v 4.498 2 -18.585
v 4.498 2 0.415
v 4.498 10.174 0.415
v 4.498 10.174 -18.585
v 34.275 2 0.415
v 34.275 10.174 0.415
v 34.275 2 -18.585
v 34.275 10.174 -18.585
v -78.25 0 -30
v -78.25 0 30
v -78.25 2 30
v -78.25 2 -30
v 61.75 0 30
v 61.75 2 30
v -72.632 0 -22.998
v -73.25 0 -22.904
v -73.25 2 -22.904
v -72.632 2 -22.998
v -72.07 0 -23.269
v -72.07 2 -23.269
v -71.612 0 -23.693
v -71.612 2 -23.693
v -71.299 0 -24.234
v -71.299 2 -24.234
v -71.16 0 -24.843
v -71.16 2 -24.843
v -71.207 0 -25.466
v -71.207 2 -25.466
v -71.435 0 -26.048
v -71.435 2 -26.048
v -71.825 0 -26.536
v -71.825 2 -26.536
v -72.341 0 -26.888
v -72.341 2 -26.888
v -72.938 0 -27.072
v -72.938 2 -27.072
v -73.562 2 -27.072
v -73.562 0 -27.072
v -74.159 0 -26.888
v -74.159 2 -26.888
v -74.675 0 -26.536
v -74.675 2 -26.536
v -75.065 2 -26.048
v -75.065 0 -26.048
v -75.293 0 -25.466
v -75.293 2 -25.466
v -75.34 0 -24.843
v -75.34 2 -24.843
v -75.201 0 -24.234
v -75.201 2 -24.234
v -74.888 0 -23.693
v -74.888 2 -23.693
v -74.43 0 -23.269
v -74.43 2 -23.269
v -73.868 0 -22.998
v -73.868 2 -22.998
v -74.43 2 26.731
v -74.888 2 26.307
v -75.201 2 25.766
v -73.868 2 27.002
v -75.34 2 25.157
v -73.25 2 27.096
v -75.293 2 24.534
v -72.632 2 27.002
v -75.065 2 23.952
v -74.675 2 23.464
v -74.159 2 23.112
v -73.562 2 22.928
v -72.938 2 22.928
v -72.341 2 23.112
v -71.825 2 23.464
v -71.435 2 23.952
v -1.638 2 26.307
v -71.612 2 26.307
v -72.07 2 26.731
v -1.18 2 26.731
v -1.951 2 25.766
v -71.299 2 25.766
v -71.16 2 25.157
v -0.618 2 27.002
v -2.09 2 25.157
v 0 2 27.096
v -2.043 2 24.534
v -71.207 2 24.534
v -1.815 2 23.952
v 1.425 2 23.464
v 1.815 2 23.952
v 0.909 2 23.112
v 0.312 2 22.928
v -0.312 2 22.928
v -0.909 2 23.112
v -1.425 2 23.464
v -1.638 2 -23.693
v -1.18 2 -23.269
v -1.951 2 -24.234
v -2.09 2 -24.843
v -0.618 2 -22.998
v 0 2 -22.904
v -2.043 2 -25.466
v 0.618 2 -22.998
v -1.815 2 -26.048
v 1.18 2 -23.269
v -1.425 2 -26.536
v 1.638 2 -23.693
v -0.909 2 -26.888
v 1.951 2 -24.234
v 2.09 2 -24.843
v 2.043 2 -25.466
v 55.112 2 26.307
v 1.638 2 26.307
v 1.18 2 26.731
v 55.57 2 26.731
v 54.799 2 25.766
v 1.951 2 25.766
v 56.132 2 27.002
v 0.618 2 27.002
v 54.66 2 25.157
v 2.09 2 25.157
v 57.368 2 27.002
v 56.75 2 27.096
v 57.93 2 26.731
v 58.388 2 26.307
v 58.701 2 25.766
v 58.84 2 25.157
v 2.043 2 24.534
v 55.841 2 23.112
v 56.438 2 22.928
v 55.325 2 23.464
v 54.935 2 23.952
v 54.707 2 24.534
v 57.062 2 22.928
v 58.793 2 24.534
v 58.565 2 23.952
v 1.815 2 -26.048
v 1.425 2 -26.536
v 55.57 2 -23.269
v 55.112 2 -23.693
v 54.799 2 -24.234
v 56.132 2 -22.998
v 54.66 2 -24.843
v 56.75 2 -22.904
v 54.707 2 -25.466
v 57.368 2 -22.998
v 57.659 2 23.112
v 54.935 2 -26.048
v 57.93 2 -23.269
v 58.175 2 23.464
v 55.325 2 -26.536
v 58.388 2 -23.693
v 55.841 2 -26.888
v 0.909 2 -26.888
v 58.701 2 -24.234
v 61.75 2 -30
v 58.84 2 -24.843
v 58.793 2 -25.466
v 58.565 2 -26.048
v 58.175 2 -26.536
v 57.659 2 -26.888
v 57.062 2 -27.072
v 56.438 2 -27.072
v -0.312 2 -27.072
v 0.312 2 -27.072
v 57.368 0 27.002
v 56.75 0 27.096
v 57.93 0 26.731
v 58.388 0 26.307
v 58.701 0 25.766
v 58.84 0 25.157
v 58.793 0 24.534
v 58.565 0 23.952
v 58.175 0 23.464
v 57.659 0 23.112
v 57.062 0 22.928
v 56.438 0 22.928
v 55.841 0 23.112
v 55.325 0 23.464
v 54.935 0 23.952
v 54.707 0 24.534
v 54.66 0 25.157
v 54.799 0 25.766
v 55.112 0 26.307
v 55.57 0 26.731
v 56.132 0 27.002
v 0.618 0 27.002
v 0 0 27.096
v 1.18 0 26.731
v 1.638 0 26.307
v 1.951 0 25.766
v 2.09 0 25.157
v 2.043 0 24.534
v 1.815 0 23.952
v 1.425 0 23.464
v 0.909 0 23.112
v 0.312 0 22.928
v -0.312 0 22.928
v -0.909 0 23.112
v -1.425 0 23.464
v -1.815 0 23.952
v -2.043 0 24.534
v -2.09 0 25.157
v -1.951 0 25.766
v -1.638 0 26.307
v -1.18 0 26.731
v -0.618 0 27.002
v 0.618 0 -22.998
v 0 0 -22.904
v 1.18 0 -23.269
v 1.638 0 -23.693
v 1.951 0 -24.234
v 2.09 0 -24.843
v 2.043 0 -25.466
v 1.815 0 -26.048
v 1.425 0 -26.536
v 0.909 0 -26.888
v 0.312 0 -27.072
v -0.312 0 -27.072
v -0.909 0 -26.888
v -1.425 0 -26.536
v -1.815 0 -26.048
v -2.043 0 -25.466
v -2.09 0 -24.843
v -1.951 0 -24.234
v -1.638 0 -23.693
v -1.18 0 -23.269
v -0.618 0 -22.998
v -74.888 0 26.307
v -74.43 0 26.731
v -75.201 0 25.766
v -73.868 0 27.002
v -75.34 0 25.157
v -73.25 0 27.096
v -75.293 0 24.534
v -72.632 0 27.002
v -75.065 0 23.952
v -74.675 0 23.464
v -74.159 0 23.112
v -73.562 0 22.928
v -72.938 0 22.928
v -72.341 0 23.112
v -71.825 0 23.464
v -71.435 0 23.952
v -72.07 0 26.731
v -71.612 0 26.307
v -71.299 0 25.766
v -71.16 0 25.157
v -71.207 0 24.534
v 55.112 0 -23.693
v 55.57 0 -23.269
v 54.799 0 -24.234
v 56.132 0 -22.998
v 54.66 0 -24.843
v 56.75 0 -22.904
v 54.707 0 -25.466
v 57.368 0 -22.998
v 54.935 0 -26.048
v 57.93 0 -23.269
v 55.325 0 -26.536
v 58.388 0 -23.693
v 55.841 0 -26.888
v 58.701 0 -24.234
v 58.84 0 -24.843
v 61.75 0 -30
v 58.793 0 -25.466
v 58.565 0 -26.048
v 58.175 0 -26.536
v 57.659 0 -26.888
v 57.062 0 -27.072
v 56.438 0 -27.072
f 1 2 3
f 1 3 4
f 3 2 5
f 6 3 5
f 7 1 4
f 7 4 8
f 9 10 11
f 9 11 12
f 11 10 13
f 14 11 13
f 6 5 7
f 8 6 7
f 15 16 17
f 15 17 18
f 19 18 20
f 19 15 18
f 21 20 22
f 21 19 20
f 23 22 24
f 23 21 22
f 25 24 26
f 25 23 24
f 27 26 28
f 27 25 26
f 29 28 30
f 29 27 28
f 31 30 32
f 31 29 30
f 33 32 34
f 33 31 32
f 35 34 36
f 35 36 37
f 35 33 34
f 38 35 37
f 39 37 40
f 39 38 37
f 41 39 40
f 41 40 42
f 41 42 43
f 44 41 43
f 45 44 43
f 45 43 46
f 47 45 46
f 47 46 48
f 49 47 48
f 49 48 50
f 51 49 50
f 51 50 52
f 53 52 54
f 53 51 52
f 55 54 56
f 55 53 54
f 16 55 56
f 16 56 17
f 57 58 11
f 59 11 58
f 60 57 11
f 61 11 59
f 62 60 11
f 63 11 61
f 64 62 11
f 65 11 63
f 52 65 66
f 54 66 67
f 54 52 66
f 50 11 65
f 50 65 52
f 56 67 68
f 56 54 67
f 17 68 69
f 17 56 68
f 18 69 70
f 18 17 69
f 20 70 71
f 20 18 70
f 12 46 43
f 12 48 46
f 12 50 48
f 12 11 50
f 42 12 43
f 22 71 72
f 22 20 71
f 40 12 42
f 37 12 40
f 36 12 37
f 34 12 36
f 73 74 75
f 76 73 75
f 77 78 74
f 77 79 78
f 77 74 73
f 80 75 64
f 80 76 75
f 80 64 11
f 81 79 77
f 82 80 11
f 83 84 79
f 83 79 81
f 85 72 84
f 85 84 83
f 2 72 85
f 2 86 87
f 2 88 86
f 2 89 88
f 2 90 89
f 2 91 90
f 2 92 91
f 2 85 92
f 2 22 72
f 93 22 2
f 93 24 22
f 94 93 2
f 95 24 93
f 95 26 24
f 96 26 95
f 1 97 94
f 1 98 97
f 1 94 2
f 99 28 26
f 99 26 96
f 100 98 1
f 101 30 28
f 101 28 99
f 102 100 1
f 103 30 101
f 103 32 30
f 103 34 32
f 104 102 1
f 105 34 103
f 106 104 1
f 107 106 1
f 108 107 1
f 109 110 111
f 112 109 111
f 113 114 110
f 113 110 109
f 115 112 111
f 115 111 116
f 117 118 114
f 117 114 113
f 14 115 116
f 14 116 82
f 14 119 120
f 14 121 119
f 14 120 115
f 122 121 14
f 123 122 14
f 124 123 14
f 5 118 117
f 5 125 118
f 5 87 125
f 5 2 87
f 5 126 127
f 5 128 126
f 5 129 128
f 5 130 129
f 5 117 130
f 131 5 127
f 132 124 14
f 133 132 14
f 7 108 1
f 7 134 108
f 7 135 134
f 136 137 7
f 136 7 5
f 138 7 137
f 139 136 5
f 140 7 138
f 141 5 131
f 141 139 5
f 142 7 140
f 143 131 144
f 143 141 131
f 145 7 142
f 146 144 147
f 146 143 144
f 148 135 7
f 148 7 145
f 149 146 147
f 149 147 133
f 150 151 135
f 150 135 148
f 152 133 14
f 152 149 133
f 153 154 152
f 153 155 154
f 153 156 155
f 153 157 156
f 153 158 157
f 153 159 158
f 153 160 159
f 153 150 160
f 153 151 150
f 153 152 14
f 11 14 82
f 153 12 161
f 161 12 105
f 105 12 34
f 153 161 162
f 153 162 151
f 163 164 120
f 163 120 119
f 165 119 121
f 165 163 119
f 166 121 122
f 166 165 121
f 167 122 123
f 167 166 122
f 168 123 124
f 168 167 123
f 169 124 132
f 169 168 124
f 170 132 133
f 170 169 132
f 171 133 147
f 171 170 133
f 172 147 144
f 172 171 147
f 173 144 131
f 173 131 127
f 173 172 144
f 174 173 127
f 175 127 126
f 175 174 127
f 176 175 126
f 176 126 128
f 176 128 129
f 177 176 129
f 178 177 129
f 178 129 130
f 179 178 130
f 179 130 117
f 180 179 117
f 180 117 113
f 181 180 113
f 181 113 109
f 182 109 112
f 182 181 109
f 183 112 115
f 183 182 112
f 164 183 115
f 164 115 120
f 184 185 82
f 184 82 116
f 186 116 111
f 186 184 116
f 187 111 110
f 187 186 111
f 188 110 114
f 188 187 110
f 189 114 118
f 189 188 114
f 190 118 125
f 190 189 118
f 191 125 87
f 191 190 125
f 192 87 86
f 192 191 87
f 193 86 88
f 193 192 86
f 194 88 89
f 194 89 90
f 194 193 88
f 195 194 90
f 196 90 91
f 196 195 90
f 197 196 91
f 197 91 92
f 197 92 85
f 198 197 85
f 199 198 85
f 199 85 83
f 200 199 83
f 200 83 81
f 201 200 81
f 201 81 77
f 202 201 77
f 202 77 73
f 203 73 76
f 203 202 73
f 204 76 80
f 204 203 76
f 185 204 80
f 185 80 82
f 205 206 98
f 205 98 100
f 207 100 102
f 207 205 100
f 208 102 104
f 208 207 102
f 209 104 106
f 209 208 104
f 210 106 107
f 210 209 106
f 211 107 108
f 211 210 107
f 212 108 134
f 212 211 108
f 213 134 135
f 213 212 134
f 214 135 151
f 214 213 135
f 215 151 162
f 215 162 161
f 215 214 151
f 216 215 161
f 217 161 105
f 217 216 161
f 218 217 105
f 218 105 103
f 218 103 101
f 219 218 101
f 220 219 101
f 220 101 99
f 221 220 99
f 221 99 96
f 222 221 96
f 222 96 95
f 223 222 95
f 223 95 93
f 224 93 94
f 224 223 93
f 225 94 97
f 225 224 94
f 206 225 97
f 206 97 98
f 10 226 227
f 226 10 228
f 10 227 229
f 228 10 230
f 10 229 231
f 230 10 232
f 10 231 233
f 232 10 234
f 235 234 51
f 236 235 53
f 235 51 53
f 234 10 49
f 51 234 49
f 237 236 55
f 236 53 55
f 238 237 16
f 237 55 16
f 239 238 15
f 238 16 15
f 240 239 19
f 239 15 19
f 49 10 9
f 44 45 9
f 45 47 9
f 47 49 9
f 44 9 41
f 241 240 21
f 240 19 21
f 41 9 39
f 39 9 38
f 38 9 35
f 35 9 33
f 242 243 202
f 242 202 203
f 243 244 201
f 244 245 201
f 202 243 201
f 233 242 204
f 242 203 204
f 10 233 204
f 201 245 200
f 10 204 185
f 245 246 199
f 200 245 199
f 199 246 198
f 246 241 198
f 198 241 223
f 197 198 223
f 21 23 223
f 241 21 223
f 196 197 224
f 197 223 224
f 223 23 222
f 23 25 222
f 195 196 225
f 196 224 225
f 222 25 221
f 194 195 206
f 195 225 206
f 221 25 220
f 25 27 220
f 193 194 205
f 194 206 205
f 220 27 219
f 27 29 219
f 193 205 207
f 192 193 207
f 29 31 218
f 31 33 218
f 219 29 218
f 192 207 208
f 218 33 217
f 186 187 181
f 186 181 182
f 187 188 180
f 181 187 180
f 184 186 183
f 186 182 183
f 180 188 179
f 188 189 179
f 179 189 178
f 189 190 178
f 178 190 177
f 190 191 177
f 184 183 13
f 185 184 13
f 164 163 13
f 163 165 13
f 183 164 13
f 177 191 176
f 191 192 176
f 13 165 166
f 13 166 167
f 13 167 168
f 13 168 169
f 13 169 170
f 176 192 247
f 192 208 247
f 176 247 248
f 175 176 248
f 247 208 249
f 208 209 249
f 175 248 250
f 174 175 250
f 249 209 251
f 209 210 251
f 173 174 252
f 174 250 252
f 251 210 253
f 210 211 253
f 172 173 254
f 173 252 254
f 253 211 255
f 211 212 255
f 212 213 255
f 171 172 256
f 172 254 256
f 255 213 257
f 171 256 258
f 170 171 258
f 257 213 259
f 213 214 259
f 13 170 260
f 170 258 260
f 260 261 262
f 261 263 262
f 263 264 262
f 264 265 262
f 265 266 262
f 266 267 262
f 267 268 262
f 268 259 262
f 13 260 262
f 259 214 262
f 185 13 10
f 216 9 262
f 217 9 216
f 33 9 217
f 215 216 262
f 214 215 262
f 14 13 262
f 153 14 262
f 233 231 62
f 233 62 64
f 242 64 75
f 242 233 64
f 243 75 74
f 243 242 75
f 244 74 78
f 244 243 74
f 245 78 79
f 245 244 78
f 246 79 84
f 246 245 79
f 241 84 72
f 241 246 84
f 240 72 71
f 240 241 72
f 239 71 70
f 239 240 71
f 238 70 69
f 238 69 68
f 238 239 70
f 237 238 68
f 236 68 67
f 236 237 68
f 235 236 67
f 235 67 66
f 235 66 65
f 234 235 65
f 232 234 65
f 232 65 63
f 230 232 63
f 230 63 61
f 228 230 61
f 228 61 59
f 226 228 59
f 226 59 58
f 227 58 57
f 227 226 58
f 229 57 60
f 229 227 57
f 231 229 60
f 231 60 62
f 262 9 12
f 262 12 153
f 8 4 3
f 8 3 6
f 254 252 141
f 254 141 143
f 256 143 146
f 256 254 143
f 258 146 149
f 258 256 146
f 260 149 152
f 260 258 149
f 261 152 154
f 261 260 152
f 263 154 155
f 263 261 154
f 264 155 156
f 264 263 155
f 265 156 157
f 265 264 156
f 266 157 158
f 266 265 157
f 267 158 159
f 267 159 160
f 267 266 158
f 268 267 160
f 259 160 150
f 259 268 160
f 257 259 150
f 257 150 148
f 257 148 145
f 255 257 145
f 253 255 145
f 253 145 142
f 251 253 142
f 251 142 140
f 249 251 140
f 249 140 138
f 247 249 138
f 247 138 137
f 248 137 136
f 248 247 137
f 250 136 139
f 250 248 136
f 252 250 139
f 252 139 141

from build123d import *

# Parameters (mm, degrees)
SKETCH1_W           = 140
SKETCH1_H           = 60
SKETCH1_R           = 2.0955
BOSS_EXTRUDE1_DEPTH = 2
SKETCH2_W           = 29.777089478
SKETCH2_H           = 19.000212295
BOSS_EXTRUDE2_DEPTH = 8.174


with BuildPart() as part:
    # Sketch1 → Boss-Extrude1 (new body)
    with BuildSketch(Plane(origin=(0, 0, 0), x_dir=(1, 0, 0), z_dir=(0, 1, 0))):
        with Locations((-8.25, 0)):
            Rectangle(SKETCH1_W, SKETCH1_H)
        with Locations(Location((-73.25, 25, 0), (0, 0, 270))):
            Circle(SKETCH1_R, mode=Mode.SUBTRACT)
        with Locations(Location((-73.25, -25, 0), (0, 0, 270))):
            Circle(SKETCH1_R, mode=Mode.SUBTRACT)
        with Locations(Location((0, 25, 0), (0, 0, 270))):
            Circle(SKETCH1_R, mode=Mode.SUBTRACT)
        with Locations(Location((0, -25, 0), (0, 0, 270))):
            Circle(SKETCH1_R, mode=Mode.SUBTRACT)
        with Locations(Location((56.75, 25, 0), (0, 0, 270))):
            Circle(SKETCH1_R, mode=Mode.SUBTRACT)
        with Locations(Location((56.75, -25, 0), (0, 0, 270))):
            Circle(SKETCH1_R, mode=Mode.SUBTRACT)
    extrude(amount=BOSS_EXTRUDE1_DEPTH)

    # Sketch2 → Boss-Extrude2 (add)
    with BuildSketch(Plane(origin=(0, 2, 0), x_dir=(1, 0, 0), z_dir=(0, 1, 0))):
        with Locations((19.386769675, 9.085304713)):
            Rectangle(SKETCH2_W, SKETCH2_H)
    extrude(amount=BOSS_EXTRUDE2_DEPTH)


solid = part.part
